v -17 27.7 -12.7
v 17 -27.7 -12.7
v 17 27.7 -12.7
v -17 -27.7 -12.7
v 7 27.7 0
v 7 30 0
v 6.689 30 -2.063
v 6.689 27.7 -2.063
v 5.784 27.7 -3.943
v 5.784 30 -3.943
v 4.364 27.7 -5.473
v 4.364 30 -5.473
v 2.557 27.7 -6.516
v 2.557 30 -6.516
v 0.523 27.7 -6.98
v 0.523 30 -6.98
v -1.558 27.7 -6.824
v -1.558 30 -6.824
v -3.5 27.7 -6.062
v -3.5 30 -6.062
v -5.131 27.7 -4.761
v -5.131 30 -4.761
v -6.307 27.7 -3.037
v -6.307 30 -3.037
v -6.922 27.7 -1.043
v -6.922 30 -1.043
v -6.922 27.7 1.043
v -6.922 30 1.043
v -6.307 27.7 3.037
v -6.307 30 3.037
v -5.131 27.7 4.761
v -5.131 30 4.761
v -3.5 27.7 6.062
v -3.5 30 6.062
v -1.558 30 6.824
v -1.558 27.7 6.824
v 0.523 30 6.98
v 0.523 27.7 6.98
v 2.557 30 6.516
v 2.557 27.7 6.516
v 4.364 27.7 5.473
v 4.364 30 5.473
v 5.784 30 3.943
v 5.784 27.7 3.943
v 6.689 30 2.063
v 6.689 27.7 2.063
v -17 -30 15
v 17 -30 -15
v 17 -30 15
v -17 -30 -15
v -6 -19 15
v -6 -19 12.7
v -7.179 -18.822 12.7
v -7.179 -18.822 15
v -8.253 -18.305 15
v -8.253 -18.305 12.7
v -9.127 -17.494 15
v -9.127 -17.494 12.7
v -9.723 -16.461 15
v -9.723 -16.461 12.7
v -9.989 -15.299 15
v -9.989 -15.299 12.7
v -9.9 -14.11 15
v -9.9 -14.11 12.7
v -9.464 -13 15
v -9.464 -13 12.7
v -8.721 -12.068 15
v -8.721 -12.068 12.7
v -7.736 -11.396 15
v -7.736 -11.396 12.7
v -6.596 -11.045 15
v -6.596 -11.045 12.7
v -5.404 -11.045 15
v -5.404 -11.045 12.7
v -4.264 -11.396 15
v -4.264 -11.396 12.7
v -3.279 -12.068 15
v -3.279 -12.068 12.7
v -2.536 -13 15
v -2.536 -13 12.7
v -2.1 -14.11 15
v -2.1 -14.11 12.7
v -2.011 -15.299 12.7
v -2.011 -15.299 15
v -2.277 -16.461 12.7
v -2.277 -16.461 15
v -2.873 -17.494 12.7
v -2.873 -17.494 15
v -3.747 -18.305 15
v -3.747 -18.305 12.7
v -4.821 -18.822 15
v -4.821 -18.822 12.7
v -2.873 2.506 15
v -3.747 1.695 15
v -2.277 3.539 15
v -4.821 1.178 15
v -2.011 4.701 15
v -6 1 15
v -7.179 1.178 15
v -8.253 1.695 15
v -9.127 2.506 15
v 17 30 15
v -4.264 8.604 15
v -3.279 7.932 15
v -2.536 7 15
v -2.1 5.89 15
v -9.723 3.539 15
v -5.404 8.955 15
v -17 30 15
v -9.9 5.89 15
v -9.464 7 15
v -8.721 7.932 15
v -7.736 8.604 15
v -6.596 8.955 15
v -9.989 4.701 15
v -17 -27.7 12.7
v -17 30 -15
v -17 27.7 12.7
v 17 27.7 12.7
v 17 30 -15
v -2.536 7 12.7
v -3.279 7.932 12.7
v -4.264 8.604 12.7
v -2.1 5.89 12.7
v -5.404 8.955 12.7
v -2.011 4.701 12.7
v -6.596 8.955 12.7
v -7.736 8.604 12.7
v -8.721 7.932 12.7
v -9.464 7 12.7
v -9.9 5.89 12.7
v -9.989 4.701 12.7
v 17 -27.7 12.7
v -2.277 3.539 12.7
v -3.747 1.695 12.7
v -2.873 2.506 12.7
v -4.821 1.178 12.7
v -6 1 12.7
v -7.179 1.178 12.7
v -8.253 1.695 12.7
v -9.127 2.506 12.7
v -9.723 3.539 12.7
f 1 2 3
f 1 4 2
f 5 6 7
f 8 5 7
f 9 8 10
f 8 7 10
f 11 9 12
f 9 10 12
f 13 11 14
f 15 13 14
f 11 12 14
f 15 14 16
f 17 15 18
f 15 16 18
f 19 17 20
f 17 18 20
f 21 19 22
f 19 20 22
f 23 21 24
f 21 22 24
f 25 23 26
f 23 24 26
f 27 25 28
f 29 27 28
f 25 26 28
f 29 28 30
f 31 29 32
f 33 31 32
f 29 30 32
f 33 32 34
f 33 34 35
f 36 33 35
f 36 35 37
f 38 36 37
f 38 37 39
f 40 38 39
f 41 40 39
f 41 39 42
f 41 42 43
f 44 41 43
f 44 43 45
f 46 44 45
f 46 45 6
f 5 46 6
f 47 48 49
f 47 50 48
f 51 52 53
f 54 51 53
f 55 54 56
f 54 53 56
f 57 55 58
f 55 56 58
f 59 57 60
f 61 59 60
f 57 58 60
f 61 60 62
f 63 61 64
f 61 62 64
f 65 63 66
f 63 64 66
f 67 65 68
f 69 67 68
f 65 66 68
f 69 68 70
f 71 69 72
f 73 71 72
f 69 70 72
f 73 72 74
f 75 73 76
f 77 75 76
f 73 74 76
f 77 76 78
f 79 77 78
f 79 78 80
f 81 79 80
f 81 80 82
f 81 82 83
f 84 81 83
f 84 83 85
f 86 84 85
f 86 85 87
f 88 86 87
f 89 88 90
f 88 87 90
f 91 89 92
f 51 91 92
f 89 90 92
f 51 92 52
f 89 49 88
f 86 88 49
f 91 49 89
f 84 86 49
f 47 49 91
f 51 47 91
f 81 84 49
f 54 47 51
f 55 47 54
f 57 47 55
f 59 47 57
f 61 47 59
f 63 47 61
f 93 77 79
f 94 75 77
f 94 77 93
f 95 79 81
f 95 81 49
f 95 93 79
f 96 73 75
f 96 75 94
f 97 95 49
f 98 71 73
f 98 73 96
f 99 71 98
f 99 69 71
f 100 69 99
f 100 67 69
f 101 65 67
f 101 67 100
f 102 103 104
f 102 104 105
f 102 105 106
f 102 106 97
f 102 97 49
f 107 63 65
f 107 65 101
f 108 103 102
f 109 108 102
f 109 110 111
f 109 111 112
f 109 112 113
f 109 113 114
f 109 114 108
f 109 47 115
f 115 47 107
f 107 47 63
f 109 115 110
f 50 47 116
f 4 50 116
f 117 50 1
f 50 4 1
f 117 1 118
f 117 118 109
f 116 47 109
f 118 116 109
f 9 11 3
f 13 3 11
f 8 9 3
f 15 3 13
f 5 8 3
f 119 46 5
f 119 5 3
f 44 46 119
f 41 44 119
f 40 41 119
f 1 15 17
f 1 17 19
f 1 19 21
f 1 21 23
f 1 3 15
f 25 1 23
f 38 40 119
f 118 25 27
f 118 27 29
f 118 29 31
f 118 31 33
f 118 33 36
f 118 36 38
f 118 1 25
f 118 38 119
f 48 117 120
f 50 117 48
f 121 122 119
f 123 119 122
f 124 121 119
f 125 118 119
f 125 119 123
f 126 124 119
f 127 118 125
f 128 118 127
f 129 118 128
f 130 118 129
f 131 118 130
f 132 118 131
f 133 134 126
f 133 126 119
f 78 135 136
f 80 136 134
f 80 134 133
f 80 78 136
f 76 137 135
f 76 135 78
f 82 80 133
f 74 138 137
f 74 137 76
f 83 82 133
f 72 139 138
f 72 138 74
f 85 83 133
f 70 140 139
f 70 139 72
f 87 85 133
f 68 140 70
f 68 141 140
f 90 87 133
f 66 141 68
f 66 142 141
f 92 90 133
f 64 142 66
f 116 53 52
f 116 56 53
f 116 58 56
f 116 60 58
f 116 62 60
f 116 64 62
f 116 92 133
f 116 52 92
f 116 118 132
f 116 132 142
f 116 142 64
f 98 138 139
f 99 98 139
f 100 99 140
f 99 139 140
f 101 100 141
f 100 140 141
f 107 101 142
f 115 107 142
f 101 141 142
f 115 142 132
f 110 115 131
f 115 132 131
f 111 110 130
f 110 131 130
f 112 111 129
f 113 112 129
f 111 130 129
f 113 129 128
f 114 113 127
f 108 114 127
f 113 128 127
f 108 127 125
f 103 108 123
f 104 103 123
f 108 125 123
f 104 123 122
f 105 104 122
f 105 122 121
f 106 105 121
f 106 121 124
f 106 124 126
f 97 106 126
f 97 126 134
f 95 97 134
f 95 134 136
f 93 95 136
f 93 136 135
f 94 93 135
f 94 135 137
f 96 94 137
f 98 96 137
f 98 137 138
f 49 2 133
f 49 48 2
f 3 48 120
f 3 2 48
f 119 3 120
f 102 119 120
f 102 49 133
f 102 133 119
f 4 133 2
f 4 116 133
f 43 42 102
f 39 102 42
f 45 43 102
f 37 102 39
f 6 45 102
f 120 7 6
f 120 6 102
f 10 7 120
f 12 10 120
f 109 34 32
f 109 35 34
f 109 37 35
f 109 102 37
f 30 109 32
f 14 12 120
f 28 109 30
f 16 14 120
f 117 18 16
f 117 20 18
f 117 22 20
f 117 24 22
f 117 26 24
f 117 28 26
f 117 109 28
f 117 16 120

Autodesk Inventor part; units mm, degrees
ref_plane "YZ Plane" through (0, 0, 0) normal (1, 0, 0) x (0, 1, 0)
ref_plane "XZ Plane" through (0, 0, 0) normal (0, 1, 0) x (-1, 0, 0)
ref_plane "XY Plane" through (0, 0, 0) normal (0, 0, 1) x (1, 0, 0)
sketch "スケッチ1" plane through (0, 0, 0) normal (1, 0, 0) x (0, 1, 0)
  line L0 (-30, 15) -> (30, 15)
  line L1 (30, 15) -> (30, -15)
  line L2 (30, -15) -> (-30, -15)
  line L3 (-30, -15) -> (-30, 15)
  line L4 (-30, 15) -> (30, -15) construction
  line L5 (30, 15) -> (-30, -15) construction
  line L6 (27.7, -12.7) -> (27.7, 12.7)
  line L7 (27.7, 12.7) -> (-27.7, 12.7)
  line L8 (-27.7, 12.7) -> (-27.7, -12.7)
  line L9 (-27.7, -12.7) -> (27.7, -12.7)
  point P0 (0, 0)
  dimension "d0" = 60
  dimension "d1" = 30
  dimension "d2" = 2.3
extrude "押し出し1" add sketch "スケッチ1" along normal mid plane 34
sketch "スケッチ2" plane through (-17, 30, 15) normal (0, 1, 0) x (1, 0, 0)
  line L0 (0, 0) -> (0, 30) projected
  circle A0 centre (17, 15) radius 7
  line L1 (34, 0) -> (0, 0) projected
  point P0 (17, 15)
  dimension "d6" = 14
  dimension "d7" = 17
  dimension "d10" = 15
extrude "押し出し2" cut sketch "スケッチ2" against normal blind 5
sketch "スケッチ3" plane through (-17, -30, 15) normal (0, 0, 1) x (1, 0, 0)
  line L0 (0, 46.9678) -> (20, 46.9678)
  line L1 (20, 46.9678) -> (20, 56.9678) projected
  line L2 (0, 56.9678) -> (20, 56.9678)
  point P0 (17, 30)
sketch "スケッチ4" plane through (-17, -30, 15) normal (0, 0, 1) x (1, 0, 0)
  circle A0 centre (11, 15) radius 4 projected
  circle A1 centre (11, 35) radius 4 projected
  point P0 (17, 30)
hole "穴1" at (-6, -15, 15) at (-6, 5, 15) direction (0, 0, -1) diameter 8 depth 4 tip angle 118
properties part number "車軸受け2"
